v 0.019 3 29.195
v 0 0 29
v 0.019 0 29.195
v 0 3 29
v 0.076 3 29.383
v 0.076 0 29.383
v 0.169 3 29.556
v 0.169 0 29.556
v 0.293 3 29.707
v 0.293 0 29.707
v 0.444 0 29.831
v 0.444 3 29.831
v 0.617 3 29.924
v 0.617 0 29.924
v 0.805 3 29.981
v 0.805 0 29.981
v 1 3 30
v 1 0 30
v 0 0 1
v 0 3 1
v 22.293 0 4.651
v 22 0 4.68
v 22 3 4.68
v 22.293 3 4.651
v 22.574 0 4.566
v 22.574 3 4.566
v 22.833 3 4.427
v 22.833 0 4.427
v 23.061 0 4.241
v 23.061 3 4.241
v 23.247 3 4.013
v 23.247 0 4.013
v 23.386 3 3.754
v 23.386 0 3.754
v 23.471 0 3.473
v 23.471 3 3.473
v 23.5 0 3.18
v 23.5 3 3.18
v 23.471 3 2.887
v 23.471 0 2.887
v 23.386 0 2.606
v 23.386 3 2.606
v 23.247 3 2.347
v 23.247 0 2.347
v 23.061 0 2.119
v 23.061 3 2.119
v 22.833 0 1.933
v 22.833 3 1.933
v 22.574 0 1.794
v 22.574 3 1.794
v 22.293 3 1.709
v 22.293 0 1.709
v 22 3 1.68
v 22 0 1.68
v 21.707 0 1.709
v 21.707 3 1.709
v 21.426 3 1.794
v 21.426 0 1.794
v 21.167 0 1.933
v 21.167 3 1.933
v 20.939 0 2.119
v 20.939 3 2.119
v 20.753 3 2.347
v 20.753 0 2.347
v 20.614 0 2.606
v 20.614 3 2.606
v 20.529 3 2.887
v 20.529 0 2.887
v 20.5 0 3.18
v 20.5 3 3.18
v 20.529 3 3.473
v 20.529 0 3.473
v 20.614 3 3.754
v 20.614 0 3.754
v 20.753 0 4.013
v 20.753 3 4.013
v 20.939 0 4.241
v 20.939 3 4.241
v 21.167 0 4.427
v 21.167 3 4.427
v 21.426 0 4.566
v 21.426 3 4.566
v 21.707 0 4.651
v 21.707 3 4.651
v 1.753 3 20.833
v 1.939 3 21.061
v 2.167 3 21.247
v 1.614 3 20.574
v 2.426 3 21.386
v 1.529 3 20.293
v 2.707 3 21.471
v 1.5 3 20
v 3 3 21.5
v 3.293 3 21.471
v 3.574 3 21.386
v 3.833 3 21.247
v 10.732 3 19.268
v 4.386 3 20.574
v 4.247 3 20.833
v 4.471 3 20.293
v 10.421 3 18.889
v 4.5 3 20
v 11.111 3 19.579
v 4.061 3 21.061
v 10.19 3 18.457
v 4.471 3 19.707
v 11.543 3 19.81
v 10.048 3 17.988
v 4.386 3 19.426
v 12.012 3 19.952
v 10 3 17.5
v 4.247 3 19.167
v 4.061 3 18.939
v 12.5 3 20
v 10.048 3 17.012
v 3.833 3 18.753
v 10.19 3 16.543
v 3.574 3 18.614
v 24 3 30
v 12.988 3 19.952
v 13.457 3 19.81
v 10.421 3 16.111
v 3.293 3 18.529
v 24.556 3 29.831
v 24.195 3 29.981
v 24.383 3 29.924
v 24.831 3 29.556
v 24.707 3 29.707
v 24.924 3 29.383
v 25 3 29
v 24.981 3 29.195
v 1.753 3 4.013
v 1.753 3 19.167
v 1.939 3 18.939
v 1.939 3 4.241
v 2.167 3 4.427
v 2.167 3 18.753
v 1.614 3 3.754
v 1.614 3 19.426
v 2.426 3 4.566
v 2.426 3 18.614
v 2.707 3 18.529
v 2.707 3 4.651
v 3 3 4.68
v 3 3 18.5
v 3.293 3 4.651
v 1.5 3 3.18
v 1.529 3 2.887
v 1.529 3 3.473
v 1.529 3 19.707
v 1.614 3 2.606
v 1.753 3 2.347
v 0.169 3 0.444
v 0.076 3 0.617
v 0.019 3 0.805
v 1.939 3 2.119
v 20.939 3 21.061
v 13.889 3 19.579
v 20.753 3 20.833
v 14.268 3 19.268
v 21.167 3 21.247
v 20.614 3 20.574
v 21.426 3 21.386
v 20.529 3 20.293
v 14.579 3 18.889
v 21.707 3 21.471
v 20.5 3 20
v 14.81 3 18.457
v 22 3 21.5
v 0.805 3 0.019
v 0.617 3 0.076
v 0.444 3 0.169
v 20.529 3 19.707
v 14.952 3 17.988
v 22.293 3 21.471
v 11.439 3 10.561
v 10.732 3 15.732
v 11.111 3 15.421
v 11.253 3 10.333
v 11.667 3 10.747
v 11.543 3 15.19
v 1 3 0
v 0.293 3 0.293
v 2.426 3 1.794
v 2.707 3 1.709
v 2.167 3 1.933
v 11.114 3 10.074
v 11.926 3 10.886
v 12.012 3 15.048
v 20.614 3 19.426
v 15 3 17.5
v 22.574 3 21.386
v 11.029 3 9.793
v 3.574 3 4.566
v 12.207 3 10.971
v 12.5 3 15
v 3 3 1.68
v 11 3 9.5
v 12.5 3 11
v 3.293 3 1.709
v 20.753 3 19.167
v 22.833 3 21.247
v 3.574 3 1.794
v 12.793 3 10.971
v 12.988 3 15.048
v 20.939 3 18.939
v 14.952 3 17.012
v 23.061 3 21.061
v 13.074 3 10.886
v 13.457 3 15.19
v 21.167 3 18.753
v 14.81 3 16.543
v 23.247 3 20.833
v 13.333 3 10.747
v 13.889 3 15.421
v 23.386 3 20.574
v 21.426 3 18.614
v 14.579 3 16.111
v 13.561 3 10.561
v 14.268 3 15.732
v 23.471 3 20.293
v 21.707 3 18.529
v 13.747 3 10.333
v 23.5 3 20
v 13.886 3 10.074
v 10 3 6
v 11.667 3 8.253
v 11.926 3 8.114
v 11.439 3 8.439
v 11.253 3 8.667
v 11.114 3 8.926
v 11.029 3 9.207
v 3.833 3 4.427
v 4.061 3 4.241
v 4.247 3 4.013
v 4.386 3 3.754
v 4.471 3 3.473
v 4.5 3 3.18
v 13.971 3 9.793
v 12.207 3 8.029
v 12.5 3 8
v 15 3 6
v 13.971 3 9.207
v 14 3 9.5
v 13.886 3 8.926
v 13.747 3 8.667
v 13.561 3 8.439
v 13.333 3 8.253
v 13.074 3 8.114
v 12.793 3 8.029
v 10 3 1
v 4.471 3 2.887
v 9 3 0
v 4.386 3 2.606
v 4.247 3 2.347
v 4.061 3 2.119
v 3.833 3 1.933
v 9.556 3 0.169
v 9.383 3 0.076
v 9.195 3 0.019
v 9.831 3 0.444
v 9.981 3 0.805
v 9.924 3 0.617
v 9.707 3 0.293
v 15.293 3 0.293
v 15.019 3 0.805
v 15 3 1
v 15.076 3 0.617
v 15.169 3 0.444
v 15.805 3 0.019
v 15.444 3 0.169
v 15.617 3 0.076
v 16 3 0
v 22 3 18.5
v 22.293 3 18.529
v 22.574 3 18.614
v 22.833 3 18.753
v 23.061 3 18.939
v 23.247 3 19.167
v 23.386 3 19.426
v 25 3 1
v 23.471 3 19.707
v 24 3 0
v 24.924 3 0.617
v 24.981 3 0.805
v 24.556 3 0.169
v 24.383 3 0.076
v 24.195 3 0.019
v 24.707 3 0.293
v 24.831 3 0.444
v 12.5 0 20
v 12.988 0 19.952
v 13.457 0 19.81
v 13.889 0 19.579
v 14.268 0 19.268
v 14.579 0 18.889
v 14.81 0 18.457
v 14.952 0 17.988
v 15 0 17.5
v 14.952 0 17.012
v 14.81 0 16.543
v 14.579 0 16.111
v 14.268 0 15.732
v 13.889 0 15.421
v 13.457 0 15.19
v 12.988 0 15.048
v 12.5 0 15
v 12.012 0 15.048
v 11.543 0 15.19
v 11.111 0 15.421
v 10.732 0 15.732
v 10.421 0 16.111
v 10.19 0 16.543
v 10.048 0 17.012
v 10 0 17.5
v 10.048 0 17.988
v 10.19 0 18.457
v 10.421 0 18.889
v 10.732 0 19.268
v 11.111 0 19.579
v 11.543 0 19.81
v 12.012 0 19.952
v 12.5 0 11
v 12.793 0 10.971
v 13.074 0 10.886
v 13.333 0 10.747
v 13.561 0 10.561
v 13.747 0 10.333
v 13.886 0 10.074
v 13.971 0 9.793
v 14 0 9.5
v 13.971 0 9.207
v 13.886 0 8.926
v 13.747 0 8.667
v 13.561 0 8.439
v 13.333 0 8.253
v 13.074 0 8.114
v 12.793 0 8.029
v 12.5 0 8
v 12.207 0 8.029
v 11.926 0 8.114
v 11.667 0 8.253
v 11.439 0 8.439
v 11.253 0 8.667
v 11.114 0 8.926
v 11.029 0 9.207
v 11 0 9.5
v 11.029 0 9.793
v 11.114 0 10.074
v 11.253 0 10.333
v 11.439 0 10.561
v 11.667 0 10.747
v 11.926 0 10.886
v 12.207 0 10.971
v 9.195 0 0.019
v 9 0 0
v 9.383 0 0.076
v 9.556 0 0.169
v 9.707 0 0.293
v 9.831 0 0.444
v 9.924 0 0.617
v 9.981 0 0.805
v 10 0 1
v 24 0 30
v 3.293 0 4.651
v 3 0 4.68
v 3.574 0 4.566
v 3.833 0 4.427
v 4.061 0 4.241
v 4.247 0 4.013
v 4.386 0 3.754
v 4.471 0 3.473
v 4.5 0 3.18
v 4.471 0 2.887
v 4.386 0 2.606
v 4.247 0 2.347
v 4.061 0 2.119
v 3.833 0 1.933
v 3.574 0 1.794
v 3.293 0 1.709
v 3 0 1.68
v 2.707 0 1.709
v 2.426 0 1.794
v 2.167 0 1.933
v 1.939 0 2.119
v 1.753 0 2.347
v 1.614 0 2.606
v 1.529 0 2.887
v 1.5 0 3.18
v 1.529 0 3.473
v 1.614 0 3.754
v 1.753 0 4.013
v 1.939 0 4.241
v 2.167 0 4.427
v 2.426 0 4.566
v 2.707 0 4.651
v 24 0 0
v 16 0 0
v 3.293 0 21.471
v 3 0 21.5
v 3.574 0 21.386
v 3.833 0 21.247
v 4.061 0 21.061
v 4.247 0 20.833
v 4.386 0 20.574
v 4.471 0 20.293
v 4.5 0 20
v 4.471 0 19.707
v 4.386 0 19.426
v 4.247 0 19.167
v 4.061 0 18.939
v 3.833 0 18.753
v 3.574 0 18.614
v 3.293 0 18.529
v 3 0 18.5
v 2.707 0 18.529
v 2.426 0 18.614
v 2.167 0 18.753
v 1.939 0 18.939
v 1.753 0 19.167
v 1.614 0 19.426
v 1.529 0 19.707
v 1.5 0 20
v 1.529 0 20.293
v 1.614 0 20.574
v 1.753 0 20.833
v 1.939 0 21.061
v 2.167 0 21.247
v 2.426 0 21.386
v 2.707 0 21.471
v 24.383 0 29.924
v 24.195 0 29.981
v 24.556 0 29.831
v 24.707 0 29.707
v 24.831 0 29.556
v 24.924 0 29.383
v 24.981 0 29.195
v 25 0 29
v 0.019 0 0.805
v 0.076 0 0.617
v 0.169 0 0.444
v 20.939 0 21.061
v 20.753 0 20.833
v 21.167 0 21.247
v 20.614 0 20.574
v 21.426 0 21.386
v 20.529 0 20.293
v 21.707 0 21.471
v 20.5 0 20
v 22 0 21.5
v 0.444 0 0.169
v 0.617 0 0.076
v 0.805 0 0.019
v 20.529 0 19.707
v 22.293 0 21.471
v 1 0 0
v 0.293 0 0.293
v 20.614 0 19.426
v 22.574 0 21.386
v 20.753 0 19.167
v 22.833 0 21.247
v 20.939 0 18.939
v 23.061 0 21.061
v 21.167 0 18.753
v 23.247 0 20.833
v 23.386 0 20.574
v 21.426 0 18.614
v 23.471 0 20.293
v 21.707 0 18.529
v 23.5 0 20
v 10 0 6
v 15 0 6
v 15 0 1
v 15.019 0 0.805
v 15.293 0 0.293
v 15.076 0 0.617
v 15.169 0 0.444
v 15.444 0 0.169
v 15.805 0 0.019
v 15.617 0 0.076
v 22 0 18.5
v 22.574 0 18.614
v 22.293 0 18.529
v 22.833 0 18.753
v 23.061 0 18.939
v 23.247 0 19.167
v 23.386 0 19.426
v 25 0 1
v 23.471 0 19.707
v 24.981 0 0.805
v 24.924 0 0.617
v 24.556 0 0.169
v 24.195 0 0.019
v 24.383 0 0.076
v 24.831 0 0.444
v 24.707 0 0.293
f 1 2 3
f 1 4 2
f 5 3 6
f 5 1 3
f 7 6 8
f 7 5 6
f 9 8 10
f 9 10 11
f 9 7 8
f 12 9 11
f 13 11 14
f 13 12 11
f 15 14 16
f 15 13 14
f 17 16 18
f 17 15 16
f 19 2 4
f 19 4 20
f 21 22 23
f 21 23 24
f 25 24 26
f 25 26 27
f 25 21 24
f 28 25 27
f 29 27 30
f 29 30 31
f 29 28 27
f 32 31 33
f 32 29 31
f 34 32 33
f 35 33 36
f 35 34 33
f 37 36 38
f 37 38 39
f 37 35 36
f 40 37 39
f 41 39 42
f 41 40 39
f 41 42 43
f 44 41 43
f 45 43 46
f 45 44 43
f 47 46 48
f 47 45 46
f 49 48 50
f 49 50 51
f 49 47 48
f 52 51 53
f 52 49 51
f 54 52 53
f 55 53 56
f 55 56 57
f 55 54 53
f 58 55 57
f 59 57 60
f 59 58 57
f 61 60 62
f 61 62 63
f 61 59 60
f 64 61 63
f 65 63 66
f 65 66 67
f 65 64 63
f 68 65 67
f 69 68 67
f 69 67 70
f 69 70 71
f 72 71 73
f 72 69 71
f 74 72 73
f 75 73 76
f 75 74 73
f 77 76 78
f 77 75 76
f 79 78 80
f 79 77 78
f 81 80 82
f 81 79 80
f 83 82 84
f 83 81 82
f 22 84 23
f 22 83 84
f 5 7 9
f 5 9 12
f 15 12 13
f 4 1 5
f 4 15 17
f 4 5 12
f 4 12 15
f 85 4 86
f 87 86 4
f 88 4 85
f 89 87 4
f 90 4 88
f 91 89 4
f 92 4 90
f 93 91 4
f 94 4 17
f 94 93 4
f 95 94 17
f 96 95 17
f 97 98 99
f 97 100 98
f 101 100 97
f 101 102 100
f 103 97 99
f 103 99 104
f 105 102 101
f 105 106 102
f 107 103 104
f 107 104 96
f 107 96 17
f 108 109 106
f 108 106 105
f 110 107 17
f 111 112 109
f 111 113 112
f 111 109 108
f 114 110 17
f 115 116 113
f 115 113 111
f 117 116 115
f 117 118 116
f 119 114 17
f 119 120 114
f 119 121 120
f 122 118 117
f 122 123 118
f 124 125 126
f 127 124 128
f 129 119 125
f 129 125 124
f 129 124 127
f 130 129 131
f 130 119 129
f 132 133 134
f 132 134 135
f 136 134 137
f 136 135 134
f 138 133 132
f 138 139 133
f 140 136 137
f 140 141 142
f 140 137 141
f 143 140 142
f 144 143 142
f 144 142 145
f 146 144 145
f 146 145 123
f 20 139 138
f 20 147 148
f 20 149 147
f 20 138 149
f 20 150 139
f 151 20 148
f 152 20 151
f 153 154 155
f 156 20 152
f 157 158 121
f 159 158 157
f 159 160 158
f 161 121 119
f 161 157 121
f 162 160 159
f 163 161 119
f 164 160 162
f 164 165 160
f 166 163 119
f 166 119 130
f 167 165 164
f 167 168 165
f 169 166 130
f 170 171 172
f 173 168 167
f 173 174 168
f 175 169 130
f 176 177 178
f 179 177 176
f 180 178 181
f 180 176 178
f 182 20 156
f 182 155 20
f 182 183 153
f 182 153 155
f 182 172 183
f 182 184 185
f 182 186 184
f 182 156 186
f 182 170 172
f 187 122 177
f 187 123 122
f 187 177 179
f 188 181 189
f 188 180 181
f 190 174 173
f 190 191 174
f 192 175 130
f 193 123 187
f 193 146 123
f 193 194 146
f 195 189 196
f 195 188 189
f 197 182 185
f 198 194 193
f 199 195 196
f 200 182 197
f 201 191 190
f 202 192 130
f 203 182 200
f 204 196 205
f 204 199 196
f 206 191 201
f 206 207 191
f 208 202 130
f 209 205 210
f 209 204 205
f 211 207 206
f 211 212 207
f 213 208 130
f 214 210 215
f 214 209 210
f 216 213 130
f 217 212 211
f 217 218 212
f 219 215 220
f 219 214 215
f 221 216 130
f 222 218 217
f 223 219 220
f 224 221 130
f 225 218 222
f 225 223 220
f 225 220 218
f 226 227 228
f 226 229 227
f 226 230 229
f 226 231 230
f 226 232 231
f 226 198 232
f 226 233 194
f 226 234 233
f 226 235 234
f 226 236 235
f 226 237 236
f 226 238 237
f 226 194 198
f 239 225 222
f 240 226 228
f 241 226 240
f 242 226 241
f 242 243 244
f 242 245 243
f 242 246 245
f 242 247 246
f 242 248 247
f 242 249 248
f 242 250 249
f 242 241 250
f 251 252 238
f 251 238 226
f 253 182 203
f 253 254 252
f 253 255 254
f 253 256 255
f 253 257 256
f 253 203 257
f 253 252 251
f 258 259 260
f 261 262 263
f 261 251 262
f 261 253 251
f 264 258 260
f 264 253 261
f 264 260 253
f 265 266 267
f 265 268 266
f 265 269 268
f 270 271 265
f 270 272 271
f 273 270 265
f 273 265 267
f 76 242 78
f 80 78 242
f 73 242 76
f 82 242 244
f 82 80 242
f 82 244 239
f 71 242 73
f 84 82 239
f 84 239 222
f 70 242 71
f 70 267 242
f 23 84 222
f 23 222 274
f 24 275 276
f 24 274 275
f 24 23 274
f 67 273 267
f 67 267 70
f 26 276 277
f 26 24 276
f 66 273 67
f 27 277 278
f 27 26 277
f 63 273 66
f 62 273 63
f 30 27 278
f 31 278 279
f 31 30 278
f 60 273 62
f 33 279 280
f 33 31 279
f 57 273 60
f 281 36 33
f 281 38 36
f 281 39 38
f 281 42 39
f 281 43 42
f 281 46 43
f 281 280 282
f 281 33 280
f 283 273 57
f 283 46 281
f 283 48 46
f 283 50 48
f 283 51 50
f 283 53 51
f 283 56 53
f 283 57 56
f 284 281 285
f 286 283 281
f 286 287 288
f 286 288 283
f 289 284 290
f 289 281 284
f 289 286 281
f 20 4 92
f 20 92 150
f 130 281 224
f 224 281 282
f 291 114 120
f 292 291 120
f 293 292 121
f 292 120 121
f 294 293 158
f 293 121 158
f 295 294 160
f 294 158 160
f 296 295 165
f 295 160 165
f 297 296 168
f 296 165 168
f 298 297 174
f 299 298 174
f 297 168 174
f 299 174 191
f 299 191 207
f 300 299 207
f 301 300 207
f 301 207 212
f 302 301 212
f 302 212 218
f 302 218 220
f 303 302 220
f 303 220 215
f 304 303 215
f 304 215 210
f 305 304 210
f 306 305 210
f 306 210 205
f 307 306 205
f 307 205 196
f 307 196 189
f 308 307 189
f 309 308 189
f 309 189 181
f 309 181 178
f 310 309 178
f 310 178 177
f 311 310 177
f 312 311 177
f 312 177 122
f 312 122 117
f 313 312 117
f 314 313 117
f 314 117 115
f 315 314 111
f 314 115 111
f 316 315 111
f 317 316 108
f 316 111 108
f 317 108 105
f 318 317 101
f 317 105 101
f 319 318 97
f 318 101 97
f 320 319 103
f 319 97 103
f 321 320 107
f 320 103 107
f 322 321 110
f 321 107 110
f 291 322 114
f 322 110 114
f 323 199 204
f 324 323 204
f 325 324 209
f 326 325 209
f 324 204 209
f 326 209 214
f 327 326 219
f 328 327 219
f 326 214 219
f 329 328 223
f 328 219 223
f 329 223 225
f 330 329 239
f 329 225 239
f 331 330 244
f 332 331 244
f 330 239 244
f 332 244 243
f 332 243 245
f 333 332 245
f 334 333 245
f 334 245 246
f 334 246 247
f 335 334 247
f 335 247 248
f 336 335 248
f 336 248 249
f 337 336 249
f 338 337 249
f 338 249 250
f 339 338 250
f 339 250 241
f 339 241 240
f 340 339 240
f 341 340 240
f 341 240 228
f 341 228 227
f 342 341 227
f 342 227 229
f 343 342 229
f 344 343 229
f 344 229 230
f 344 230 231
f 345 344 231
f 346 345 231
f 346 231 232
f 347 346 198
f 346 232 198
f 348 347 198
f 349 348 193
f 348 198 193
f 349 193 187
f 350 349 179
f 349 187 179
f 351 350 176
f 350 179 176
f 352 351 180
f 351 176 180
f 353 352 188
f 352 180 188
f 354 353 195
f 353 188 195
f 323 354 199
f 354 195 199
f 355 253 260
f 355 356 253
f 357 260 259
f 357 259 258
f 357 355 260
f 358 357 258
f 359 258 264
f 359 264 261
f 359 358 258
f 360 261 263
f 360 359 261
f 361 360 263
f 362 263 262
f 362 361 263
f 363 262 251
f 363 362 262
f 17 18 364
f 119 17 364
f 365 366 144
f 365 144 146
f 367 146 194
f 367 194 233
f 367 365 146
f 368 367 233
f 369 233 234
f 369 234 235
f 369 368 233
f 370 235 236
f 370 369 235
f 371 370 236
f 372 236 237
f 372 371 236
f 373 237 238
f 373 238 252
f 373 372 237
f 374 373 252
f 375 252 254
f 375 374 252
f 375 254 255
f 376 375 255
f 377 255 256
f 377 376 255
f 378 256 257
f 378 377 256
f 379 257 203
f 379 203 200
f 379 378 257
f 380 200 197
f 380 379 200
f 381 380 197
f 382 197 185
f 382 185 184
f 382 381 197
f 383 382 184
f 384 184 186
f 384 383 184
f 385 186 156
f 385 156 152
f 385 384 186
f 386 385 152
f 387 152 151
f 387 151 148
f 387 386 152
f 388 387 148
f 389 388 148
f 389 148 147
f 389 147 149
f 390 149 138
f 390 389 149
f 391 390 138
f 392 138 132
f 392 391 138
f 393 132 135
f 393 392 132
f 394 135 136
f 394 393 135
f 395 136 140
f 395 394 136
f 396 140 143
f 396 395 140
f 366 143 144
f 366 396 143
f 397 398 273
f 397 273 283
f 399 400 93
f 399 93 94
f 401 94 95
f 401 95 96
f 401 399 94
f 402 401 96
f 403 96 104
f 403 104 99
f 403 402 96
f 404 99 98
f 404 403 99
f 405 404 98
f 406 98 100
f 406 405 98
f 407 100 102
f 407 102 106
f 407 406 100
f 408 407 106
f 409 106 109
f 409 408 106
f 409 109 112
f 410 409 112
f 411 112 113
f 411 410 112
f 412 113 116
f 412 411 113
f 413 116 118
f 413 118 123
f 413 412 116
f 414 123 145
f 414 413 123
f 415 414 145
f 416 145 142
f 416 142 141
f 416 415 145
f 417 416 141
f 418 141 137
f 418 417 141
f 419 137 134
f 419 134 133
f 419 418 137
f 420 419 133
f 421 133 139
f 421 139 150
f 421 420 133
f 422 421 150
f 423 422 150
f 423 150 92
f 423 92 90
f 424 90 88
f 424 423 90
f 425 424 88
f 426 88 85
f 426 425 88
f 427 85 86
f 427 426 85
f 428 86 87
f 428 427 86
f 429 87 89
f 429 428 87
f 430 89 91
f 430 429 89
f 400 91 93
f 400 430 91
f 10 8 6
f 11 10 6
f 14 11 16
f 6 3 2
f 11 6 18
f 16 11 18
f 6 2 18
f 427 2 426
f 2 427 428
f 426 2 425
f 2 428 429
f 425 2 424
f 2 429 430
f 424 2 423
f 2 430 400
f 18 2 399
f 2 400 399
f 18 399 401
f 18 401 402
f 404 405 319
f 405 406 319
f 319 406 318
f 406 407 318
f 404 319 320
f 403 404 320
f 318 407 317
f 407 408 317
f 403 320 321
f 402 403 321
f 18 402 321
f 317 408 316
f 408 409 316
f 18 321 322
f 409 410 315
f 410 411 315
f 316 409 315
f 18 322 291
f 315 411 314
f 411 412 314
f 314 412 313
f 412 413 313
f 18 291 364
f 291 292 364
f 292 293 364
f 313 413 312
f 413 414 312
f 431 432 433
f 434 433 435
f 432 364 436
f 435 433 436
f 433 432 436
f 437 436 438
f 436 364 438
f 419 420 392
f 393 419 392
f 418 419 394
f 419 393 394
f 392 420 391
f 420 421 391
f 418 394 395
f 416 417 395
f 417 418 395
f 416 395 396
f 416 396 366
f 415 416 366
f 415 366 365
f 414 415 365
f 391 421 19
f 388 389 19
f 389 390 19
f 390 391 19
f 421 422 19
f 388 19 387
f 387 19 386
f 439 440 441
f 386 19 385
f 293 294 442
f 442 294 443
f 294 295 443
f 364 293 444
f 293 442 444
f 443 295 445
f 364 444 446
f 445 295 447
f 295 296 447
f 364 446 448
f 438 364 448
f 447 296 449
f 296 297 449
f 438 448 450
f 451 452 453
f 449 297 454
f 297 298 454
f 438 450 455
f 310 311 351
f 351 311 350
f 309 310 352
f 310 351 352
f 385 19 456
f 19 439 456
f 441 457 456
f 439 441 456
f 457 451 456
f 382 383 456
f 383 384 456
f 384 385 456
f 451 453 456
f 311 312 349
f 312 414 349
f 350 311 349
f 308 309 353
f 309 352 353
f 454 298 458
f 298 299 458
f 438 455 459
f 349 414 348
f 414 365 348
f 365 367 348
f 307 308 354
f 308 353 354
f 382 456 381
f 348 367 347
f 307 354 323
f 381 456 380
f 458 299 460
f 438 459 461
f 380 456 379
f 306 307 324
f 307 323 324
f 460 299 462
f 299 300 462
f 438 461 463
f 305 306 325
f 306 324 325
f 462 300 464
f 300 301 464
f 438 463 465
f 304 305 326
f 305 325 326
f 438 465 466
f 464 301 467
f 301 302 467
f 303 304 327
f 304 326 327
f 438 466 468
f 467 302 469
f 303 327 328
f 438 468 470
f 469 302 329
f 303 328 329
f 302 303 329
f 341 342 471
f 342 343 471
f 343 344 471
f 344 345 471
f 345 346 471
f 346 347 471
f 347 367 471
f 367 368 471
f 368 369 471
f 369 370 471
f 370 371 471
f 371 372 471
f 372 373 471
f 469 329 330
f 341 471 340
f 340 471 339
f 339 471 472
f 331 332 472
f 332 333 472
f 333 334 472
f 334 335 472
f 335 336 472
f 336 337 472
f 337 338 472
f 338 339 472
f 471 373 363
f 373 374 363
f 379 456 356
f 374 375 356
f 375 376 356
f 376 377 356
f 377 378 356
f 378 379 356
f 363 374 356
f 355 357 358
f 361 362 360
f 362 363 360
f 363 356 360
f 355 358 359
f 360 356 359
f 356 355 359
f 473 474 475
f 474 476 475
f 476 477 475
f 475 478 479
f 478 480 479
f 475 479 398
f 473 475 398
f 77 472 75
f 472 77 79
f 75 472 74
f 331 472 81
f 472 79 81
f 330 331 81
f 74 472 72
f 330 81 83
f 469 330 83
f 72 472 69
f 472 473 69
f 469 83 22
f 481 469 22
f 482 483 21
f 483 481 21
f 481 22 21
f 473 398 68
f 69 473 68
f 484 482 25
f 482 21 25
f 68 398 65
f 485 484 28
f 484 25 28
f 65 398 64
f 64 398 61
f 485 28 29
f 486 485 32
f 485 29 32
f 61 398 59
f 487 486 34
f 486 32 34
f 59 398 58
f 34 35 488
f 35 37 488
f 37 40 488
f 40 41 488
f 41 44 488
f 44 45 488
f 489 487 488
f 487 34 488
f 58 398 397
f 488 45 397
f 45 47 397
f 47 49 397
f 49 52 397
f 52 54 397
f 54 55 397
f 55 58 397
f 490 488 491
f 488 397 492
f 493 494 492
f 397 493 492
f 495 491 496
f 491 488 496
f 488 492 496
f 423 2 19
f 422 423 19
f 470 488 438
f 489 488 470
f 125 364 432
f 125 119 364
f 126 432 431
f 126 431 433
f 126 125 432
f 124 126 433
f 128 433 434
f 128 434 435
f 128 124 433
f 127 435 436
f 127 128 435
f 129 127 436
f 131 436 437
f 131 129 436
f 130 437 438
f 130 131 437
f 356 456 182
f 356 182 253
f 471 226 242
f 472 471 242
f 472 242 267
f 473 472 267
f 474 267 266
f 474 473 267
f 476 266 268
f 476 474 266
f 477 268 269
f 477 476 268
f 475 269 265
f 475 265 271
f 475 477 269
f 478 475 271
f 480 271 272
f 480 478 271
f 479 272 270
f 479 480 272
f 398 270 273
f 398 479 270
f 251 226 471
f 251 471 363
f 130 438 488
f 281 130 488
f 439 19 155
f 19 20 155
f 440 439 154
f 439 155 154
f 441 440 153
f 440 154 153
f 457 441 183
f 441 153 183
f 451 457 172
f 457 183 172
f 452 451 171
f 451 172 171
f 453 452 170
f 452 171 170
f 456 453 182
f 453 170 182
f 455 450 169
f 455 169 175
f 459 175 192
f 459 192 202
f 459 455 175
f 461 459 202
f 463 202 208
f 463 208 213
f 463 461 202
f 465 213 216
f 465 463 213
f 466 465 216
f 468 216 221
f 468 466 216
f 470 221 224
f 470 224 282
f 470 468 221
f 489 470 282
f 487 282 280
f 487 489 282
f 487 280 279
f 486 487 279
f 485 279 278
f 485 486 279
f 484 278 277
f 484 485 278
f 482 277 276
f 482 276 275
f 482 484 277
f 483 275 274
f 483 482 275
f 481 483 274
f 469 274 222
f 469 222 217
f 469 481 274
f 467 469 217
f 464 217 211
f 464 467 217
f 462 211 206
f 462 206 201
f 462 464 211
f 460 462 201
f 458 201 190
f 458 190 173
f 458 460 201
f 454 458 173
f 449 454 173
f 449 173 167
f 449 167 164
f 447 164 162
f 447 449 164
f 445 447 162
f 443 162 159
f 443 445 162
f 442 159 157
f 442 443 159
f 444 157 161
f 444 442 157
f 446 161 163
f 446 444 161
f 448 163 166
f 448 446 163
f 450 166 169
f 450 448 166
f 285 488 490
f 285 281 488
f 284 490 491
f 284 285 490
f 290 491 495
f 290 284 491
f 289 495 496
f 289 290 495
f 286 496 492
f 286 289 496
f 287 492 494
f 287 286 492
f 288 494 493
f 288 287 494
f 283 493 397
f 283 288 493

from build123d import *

# Parameters (mm, degrees)
SKETCH1_W           = 25
SKETCH1_H           = 30
SKETCH1_R           = 1.5
BOSS_EXTRUDE1_DEPTH = 3
SKETCH2_R           = 1.5
SKETCH2_R_2         = 2.5
SKETCH2_W           = 5
SKETCH2_H           = 6
CUT_EXTRUDE1_DEPTH  = 40.166312055
FILLET2_R           = 1


with BuildPart() as part:
    # Sketch1 → Boss-Extrude1 (new body)
    with BuildSketch(Plane(origin=(0, 0, 0), x_dir=(1, 0, 0), z_dir=(0, 1, 0))):
        with Locations((12.5, -15)):
            Rectangle(SKETCH1_W, SKETCH1_H)
        with Locations(Location((3, -20, 0), (0, 0, 270))):
            Circle(SKETCH1_R, mode=Mode.SUBTRACT)
        with Locations(Location((22, -20, 0), (0, 0, 270))):
            Circle(SKETCH1_R, mode=Mode.SUBTRACT)
        with Locations(Location((22, -3.18, 0), (0, 0, 270))):
            Circle(SKETCH1_R, mode=Mode.SUBTRACT)
        with Locations(Location((3, -3.18, 0), (0, 0, 270))):
            Circle(SKETCH1_R, mode=Mode.SUBTRACT)
    extrude(amount=BOSS_EXTRUDE1_DEPTH)

    # Sketch2 → Cut-Extrude1 (cut, through all)
    with BuildSketch(Plane(origin=(0, 3, 0), x_dir=(1, 0, 0), z_dir=(0, 1, 0))):
        with Locations(Location((12.5, -9.5, 0), (0, 0, 270))):
            Circle(SKETCH2_R)
        with Locations(Location((12.5, -17.5, 0), (0, 0, 270))):
            Circle(SKETCH2_R_2)
        with Locations((12.5, -3)):
            Rectangle(SKETCH2_W, SKETCH2_H)
    extrude(amount=-CUT_EXTRUDE1_DEPTH, mode=Mode.SUBTRACT)

    # Fillet2
    fillet2_edges = [part.edges().sort_by_distance(p)[0] for p in [
        (10, 1.5, 0),
        (15, 1.5, 0),
        (0, 1.5, 0),
        (25, 1.5, 0),
        (25, 1.5, 30),
        (0, 1.5, 30),
    ]]
    fillet(fillet2_edges, radius=FILLET2_R)


solid = part.part
